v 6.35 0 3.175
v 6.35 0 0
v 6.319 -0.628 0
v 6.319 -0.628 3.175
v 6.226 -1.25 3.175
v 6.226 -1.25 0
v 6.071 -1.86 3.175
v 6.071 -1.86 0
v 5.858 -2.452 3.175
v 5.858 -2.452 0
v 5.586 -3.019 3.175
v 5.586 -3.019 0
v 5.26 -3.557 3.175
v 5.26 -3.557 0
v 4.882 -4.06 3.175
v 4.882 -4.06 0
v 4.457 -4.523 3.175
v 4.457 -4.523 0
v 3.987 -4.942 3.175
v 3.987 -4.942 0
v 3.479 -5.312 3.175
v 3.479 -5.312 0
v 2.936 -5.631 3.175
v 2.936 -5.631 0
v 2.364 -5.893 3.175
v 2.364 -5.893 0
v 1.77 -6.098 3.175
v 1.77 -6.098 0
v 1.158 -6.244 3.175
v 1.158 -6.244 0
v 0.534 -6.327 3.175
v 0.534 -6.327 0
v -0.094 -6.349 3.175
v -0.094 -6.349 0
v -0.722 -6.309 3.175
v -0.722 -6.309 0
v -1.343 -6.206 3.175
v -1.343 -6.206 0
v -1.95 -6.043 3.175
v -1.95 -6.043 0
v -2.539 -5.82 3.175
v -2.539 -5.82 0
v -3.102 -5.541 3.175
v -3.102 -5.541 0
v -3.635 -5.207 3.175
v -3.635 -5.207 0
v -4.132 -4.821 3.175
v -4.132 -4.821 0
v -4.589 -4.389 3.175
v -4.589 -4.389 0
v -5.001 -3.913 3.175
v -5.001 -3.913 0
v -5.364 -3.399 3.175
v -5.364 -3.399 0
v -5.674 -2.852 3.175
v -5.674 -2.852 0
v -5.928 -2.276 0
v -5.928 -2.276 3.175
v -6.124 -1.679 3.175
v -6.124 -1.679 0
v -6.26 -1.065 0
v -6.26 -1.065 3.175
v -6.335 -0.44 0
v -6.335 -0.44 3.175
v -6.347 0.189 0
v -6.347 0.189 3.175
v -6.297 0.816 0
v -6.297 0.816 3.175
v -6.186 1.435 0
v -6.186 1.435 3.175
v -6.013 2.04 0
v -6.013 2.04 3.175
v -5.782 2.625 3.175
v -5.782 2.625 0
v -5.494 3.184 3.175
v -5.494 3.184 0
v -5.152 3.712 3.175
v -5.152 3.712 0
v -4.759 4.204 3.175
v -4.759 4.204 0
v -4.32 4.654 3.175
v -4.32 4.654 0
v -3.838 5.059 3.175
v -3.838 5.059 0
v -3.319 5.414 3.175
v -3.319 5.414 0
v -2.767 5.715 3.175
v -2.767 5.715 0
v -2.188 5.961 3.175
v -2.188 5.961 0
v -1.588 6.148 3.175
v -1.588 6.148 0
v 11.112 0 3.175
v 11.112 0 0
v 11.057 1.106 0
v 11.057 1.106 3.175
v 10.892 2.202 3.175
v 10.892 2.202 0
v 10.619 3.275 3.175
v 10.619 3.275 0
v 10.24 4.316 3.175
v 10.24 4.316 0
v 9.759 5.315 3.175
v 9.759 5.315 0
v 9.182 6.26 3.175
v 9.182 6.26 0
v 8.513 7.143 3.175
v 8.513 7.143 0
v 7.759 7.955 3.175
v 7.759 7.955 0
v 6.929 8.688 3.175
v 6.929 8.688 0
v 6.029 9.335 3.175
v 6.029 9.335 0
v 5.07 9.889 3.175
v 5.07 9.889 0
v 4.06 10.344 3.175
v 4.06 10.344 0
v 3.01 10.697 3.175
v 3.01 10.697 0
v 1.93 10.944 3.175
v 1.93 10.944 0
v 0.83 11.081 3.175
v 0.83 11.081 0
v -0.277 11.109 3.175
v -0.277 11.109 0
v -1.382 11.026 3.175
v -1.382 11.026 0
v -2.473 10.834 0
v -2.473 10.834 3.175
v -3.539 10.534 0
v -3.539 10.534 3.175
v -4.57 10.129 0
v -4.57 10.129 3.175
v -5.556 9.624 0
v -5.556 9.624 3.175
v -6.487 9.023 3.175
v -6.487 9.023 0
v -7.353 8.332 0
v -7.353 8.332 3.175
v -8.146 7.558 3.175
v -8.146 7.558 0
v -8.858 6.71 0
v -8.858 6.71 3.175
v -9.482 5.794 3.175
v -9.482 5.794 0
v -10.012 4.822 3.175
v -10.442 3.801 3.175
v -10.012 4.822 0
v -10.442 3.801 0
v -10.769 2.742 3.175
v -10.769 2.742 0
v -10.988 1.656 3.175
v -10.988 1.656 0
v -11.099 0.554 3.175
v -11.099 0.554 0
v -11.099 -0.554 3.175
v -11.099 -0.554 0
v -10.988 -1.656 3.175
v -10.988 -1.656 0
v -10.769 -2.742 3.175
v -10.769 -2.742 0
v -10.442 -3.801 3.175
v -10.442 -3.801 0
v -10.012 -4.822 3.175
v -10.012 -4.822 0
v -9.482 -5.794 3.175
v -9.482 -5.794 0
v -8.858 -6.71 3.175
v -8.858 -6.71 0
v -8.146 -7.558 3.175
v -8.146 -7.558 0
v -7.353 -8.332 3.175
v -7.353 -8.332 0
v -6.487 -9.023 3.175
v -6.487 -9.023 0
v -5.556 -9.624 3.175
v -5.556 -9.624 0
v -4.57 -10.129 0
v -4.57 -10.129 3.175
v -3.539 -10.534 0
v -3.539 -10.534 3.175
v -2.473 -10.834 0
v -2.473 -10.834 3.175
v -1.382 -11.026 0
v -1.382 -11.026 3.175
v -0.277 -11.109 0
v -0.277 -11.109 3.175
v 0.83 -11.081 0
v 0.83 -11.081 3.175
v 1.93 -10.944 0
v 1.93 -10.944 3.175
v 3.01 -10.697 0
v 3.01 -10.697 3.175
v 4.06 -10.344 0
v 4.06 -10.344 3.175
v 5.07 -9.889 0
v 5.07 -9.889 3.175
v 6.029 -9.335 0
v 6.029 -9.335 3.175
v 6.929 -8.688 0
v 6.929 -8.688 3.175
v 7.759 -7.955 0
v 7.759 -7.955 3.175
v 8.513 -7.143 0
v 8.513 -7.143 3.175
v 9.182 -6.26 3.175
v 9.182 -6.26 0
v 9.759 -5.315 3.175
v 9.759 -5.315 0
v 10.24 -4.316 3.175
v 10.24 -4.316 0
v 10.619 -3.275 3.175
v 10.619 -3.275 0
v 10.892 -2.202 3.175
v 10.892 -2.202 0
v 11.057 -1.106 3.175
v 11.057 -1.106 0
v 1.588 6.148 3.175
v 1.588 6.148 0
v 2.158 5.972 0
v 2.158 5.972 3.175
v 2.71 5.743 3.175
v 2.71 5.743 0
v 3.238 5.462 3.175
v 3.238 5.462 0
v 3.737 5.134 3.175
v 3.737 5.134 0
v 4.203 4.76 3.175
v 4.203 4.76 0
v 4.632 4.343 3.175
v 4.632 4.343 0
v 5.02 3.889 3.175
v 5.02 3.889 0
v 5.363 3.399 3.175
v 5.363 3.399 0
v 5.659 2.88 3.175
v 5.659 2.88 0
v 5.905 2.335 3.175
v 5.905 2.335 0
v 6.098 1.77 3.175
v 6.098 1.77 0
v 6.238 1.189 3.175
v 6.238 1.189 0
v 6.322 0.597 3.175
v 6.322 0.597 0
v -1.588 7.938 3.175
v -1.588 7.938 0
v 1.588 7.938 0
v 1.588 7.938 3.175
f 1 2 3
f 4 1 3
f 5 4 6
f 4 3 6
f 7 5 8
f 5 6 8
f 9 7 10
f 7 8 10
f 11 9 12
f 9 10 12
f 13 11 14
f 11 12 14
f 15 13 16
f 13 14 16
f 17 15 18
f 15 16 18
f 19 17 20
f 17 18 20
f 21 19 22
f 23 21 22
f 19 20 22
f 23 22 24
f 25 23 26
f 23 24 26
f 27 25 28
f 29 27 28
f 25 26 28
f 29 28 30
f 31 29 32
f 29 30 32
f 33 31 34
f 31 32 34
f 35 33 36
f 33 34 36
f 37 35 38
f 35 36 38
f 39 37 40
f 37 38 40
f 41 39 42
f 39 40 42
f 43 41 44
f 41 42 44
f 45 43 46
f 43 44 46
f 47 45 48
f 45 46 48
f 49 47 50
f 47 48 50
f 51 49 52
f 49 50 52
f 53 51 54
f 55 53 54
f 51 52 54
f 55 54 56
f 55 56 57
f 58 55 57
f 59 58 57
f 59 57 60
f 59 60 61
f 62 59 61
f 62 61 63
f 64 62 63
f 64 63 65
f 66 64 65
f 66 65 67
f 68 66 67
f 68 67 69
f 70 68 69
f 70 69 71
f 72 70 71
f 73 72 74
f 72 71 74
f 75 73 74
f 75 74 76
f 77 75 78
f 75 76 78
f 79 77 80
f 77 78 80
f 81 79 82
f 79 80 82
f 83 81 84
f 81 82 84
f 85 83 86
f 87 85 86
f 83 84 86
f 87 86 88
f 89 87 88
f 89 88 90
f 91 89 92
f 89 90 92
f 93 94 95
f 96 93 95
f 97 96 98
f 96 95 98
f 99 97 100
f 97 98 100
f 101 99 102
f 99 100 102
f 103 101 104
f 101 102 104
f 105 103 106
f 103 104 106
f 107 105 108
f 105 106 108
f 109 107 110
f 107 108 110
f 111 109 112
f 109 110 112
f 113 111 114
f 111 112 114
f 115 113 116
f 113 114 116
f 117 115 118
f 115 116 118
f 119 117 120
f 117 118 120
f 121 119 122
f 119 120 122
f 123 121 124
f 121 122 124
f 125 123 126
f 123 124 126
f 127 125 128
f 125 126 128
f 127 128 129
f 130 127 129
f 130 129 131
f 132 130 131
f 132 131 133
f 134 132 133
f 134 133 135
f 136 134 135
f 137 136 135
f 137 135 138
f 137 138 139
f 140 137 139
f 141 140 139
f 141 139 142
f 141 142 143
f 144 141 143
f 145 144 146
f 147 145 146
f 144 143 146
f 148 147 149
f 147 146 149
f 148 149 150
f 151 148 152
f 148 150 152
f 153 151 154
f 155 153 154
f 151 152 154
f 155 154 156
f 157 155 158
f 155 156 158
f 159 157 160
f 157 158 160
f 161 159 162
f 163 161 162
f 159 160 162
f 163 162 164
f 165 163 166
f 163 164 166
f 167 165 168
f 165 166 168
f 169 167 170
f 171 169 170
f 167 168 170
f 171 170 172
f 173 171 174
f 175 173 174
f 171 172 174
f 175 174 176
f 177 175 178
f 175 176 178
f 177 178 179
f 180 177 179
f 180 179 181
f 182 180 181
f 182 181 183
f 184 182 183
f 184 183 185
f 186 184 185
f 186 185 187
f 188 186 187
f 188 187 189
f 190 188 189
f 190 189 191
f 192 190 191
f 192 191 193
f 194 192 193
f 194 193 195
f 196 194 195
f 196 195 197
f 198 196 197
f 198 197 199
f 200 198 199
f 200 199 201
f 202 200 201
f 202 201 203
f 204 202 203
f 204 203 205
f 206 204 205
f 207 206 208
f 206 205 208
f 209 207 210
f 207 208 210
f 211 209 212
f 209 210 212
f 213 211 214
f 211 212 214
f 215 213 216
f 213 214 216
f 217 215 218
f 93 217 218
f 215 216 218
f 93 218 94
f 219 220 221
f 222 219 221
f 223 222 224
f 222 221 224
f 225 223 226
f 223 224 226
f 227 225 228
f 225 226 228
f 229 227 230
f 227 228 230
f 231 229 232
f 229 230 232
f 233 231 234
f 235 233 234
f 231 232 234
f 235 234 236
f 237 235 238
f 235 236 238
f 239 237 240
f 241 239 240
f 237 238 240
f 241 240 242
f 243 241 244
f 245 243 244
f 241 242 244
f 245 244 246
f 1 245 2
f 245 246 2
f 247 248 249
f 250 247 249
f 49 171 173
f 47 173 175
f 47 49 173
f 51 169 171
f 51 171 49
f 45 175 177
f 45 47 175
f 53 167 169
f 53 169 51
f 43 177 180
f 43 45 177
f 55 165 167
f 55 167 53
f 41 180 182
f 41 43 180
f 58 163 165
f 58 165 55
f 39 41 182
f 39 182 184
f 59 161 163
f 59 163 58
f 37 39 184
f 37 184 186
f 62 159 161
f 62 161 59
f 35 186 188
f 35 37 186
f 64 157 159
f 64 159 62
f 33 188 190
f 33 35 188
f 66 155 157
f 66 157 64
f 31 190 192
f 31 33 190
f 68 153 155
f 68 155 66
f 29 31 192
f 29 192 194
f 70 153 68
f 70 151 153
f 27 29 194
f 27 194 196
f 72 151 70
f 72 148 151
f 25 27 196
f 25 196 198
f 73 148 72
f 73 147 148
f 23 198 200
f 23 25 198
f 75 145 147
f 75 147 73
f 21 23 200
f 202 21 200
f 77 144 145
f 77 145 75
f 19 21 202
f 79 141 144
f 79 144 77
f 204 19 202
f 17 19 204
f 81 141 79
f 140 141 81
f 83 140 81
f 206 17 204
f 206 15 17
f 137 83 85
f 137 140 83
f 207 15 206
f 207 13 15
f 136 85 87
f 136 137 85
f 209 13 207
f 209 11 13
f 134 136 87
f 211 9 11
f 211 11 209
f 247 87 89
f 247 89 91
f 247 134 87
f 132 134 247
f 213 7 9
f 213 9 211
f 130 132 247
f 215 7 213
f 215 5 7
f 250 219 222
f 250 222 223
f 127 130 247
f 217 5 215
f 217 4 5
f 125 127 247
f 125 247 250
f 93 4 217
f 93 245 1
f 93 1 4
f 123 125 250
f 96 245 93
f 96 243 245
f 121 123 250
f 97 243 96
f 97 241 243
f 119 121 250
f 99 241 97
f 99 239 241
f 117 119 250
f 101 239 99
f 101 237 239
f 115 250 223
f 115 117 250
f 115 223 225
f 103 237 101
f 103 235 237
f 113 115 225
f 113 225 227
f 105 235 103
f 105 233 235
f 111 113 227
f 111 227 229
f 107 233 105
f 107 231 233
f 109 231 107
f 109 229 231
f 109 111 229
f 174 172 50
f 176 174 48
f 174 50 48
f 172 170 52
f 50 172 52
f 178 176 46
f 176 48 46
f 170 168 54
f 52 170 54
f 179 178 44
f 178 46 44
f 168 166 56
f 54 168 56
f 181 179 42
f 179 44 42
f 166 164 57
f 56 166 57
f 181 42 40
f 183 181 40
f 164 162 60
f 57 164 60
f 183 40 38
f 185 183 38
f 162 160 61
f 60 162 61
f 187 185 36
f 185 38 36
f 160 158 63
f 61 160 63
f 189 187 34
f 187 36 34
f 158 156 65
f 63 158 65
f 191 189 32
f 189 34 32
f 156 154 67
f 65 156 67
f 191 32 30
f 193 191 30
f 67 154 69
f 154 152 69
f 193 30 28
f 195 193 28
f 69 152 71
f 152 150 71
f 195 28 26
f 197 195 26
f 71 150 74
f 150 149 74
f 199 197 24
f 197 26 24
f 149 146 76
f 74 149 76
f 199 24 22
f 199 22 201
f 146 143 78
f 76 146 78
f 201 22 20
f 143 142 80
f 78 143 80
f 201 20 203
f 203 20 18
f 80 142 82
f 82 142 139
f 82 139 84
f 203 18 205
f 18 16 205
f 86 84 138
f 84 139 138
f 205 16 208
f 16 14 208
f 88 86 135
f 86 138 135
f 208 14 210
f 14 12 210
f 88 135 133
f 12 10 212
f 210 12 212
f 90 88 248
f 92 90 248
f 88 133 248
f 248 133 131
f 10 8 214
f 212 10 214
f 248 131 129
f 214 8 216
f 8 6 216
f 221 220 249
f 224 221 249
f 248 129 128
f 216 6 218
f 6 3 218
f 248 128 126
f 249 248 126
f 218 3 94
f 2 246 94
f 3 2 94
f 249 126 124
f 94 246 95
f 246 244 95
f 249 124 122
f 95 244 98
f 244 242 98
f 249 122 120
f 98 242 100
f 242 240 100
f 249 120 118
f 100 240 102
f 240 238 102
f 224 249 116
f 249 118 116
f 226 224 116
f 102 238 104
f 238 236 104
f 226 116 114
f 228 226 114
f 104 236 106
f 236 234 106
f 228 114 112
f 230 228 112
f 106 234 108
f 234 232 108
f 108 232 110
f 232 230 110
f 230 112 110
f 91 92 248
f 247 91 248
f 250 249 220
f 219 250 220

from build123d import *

# Parameters (mm, degrees)
F0_R     = 11.1125
F1_DEPTH = 3.175


with BuildPart() as f1:
    # F0 (on Top) → F1 (new body)
    with BuildSketch(Plane.XY):
        Circle(F0_R)
        with BuildLine():
            ThreePointArc((1.5875, 6.148361), (5.020116, 3.888565), (6.35, 0))
            ThreePointArc((6.35, 0), (-3.888565, -5.020116), (-1.5875, 6.148361))
            Line((-1.5875, 6.148361), (-1.5875, 6.35))
            Line((-1.5875, 6.35), (-1.5875, 7.9375))
            Line((-1.5875, 7.9375), (1.5875, 7.9375))
            Line((1.5875, 7.9375), (1.5875, 6.35))
            Line((1.5875, 6.35), (1.5875, 6.148361))
        make_face(mode=Mode.SUBTRACT)
    extrude(amount=F1_DEPTH)


solid = f1.part
